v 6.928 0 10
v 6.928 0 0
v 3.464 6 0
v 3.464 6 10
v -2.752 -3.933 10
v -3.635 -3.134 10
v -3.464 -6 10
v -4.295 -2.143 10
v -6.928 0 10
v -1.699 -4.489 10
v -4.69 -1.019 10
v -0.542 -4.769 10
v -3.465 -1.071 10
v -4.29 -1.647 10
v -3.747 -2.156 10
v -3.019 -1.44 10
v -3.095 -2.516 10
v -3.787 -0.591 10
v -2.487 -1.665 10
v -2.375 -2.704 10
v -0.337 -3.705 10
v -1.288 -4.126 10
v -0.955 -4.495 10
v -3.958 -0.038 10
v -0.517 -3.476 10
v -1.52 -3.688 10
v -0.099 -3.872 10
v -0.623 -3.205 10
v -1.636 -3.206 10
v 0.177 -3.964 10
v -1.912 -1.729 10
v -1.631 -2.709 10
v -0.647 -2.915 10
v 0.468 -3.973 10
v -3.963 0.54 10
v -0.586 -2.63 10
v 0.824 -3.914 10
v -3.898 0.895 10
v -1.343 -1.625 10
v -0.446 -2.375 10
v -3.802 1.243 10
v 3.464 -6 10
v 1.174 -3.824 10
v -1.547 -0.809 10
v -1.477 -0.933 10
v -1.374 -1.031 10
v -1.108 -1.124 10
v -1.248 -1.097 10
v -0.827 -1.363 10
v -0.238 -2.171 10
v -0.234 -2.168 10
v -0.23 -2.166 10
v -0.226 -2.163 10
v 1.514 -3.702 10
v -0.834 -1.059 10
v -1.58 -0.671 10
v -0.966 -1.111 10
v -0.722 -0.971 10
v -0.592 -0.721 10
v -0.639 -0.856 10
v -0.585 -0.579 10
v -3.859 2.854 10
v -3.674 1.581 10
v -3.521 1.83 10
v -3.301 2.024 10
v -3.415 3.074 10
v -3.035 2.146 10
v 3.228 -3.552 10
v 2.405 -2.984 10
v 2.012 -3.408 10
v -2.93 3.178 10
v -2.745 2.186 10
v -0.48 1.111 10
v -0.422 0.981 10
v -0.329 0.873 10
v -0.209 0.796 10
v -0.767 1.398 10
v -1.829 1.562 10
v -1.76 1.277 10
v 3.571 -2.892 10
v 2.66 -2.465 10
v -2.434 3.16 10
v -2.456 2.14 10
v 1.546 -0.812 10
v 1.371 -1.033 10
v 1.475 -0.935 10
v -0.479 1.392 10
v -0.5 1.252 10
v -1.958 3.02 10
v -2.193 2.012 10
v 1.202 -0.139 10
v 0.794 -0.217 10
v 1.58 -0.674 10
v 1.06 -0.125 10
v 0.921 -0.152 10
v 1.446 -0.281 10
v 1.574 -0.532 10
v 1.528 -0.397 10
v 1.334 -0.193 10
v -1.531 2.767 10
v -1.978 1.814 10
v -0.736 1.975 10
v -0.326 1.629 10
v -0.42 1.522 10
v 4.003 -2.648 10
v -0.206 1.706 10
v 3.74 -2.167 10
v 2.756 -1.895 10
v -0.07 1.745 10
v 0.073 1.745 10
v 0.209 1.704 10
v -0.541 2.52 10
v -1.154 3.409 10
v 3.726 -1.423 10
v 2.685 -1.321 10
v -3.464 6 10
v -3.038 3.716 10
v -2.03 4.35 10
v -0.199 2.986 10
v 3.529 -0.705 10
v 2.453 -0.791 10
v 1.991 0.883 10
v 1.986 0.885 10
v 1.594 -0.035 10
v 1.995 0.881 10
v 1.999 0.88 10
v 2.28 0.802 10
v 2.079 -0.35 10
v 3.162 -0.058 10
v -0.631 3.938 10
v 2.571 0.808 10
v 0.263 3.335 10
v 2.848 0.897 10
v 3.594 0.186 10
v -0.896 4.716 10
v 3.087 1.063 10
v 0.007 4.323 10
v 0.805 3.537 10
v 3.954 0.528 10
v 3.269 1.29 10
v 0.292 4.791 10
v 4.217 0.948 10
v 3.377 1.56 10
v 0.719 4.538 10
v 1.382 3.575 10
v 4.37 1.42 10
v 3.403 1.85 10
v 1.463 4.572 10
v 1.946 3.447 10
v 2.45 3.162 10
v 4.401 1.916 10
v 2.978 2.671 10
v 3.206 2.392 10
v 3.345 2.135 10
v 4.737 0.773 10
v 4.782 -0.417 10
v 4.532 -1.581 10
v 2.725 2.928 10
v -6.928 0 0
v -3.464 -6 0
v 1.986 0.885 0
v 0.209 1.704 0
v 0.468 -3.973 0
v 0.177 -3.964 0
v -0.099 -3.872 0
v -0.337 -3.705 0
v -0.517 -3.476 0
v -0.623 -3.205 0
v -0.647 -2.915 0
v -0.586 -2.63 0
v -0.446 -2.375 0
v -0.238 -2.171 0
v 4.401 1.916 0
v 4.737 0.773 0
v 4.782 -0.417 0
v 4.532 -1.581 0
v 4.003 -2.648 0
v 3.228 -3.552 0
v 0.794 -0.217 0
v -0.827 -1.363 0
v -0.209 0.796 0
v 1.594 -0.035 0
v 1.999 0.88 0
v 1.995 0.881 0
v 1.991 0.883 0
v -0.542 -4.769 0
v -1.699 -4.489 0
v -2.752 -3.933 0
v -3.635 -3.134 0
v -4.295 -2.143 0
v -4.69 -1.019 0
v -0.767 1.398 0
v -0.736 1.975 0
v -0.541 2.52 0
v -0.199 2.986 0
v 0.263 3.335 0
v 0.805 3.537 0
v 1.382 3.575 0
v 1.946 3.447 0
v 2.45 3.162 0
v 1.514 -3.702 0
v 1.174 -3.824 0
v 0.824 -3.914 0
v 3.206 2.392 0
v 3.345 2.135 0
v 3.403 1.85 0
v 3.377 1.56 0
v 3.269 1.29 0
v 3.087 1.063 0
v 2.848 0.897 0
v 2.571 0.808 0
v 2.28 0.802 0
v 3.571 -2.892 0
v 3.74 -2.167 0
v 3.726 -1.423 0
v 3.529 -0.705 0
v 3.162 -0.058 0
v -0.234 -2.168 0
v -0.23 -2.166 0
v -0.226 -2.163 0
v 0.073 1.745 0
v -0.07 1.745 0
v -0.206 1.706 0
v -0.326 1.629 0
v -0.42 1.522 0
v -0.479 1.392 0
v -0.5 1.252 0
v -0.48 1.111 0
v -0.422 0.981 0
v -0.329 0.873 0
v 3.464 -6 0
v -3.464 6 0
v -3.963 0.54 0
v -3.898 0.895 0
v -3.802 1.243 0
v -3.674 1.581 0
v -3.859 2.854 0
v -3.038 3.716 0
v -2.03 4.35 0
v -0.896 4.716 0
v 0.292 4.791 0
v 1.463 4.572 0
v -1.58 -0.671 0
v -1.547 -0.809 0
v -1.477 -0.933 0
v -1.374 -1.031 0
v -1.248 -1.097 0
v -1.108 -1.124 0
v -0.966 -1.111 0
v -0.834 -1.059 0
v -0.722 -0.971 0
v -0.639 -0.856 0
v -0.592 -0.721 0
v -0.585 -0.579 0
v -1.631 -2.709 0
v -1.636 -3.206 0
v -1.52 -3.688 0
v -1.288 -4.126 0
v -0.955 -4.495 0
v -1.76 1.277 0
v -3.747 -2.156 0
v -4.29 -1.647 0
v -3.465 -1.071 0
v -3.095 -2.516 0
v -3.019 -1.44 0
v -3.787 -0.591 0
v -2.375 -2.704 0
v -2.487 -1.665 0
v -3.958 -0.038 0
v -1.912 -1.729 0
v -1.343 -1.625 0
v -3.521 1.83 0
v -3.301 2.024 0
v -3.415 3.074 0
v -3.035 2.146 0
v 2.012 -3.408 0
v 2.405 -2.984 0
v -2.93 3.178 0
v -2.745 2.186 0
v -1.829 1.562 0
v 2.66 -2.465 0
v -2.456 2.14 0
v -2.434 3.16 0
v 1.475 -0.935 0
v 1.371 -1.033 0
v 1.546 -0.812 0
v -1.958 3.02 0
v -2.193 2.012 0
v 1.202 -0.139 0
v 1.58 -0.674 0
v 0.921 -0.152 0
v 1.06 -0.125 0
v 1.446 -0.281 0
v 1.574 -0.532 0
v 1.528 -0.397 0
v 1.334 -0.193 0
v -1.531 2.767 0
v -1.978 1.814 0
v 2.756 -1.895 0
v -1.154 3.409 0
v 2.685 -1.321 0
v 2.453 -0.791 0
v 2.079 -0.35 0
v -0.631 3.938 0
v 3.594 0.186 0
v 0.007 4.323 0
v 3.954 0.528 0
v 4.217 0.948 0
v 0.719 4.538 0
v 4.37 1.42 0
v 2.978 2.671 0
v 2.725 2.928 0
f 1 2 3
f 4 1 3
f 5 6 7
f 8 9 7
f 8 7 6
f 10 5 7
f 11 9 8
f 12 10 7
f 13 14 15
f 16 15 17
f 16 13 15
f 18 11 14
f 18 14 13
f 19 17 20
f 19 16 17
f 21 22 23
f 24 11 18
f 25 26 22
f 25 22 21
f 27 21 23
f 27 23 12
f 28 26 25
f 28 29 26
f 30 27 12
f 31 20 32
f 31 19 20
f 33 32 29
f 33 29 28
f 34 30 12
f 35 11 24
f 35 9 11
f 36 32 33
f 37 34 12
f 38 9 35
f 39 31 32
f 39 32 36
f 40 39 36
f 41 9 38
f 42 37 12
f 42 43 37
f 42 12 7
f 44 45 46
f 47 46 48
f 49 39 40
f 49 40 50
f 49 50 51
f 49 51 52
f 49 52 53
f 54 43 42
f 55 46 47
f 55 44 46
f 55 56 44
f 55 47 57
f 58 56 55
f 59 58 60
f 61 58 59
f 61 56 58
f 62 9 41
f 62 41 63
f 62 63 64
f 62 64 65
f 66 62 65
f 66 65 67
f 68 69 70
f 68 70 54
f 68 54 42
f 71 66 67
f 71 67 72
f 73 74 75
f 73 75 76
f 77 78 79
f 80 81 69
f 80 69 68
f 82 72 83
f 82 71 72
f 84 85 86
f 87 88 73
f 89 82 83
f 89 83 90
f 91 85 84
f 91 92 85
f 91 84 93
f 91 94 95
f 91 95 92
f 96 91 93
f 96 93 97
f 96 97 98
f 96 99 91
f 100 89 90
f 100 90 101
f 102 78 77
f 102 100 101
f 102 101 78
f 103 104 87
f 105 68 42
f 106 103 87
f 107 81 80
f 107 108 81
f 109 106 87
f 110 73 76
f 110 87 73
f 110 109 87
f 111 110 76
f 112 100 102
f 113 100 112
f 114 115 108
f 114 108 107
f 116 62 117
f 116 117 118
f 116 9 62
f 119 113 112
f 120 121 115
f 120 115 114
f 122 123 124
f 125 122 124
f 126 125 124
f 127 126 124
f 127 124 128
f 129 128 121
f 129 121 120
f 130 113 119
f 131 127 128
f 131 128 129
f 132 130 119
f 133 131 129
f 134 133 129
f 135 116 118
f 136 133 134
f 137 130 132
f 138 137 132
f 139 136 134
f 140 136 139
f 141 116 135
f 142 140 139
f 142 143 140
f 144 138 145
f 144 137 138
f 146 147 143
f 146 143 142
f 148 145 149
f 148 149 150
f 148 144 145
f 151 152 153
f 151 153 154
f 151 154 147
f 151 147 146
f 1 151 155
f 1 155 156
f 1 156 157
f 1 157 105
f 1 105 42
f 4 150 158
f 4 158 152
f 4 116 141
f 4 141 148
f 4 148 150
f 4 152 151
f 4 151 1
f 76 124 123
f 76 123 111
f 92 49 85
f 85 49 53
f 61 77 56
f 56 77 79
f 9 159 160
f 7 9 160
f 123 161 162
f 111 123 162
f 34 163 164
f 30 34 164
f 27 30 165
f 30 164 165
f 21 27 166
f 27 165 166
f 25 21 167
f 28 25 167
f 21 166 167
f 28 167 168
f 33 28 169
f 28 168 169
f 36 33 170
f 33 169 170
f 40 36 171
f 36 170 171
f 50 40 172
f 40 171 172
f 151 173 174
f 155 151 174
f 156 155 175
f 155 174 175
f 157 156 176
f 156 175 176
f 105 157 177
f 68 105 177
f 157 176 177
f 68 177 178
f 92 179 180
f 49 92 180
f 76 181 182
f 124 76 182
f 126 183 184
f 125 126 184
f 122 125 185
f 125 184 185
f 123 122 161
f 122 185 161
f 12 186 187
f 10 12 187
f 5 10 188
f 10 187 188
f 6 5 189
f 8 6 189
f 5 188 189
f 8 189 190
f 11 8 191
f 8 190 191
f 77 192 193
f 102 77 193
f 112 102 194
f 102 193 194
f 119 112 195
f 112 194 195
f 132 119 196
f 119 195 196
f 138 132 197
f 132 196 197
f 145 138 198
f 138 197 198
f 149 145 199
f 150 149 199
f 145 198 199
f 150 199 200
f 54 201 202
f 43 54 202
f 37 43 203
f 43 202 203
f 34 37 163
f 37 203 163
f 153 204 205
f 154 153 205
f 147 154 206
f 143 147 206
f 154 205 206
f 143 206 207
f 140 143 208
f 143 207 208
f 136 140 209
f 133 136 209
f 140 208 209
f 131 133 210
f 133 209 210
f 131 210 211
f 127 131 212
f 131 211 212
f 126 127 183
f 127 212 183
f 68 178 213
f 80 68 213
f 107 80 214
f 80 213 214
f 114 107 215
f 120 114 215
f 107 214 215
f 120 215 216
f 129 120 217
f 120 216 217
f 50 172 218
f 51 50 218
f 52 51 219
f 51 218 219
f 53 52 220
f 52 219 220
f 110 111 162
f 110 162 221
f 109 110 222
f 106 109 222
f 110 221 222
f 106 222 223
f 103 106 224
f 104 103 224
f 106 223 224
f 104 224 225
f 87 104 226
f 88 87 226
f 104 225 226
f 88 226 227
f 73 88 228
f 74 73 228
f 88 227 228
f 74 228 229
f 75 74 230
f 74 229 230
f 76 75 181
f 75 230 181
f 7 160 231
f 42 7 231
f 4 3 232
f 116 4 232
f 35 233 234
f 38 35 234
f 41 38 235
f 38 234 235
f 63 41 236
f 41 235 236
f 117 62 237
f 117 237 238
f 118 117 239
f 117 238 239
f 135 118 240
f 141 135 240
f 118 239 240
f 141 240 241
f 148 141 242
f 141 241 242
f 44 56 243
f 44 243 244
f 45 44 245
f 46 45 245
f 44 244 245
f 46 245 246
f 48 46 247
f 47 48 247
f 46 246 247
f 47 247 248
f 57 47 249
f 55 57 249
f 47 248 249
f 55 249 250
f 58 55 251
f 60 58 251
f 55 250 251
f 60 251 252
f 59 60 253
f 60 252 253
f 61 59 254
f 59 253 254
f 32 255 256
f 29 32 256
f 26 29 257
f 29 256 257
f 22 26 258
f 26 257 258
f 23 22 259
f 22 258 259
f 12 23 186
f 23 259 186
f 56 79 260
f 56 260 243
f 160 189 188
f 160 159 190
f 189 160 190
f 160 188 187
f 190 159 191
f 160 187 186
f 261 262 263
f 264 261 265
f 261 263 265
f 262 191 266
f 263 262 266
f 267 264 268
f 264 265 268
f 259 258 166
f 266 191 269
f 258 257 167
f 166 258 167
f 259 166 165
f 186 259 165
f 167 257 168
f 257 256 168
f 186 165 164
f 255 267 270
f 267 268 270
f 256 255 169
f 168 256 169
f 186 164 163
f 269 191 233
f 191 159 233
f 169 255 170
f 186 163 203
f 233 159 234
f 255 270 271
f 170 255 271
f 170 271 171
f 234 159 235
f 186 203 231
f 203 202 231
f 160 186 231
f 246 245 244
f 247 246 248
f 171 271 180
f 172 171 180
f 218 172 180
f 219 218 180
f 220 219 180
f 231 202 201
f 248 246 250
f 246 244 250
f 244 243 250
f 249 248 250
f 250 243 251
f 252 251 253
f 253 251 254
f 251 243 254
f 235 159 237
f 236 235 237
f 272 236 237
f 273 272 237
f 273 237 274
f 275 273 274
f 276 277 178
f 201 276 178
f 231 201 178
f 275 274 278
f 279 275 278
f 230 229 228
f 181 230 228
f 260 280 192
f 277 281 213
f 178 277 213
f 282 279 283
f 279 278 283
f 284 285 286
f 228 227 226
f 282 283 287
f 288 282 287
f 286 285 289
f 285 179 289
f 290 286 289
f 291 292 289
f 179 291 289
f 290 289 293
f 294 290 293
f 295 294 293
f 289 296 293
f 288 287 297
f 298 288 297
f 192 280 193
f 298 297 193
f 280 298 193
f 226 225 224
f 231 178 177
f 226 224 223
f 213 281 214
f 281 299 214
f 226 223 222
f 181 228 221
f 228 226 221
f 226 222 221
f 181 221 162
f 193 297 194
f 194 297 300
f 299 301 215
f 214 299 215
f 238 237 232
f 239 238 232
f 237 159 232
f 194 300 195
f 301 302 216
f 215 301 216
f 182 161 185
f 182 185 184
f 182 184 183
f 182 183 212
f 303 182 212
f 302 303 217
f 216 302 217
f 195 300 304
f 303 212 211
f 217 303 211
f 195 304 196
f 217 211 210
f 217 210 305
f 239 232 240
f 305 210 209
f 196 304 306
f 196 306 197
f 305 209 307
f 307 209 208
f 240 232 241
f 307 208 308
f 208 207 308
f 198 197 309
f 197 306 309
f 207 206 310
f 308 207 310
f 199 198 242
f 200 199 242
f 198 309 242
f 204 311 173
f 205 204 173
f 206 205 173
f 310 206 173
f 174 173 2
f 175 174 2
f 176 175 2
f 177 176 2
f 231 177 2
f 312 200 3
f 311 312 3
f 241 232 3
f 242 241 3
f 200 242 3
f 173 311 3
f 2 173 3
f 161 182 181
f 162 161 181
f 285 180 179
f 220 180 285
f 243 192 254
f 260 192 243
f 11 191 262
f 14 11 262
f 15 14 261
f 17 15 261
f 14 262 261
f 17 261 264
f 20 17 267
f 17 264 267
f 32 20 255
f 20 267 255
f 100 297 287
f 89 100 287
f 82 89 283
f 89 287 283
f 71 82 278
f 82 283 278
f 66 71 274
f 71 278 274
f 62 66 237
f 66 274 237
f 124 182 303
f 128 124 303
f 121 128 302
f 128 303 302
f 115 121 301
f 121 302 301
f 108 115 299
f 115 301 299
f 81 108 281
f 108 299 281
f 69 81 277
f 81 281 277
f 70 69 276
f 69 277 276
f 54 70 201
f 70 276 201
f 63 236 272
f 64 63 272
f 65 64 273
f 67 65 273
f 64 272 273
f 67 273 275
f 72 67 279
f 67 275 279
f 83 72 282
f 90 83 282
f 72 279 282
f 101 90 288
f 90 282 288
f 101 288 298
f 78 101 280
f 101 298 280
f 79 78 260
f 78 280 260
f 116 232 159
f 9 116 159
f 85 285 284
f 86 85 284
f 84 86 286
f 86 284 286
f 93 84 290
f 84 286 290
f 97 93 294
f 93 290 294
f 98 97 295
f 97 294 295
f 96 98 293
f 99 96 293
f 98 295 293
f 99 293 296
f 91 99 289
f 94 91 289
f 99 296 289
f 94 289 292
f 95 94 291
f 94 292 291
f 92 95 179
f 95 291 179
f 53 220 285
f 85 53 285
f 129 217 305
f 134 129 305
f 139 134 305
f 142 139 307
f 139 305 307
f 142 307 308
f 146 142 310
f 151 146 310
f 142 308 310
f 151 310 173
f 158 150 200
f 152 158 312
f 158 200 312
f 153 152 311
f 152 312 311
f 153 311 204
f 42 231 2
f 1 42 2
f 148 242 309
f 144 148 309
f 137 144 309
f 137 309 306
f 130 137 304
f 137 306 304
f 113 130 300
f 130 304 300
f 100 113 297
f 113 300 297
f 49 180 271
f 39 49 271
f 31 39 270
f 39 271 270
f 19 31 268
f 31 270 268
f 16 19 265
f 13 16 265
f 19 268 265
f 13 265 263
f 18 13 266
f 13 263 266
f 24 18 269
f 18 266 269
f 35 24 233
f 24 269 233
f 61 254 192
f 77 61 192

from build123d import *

# Parameters (mm, degrees)
F1_DEPTH = 10


with BuildPart() as f1:
    # F0 (on Top) → F1 (new body)
    with BuildSketch(Plane.XY):
        Polygon((3.464102, 6), (-3.464102, 6), (-6.928203, 0), (-3.464102, -6), (3.464102, -6), (6.928203, 0), align=None)
        with BuildLine():
            ThreePointArc((-0.54173, -4.769332), (-3.218595, -3.560989), (-4.690485, -1.019485))
            ThreePointArc((-4.690485, -1.019485), (-3.432213, -2.356022), (-1.630911, -2.709417))
            ThreePointArc((-1.630911, -2.709417), (-1.417251, -3.914354), (-0.54173, -4.769332))
        make_face(mode=Mode.SUBTRACT)
        with BuildLine():
            Line((1.986308, 0.885414), (0.209216, 1.704124))
            ThreePointArc((0.209216, 1.704124), (-0.454124, 1.459216), (-0.209216, 0.795876))
            Line((-0.209216, 0.795876), (1.593748, -0.034753))
            ThreePointArc((1.593748, -0.034753), (2.75641, -1.894851), (1.51377, -3.702499))
            ThreePointArc((1.51377, -3.702499), (1.000033, -3.872975), (0.467983, -3.97253))
            ThreePointArc((0.467983, -3.97253), (-0.580071, -3.344267), (-0.237933, -2.171206))
            ThreePointArc((-0.237933, -2.171206), (-0.232163, -2.167033), (-0.226363, -2.162901))
            Line((-0.226363, -2.162901), (1.371207, -1.033248))
            ThreePointArc((1.371207, -1.033248), (1.49078, -0.336325), (0.793857, -0.216752))
            Line((0.793857, -0.216752), (-0.826971, -1.36285))
            ThreePointArc((-0.826971, -1.36285), (-3.019194, -1.439695), (-3.963343, 0.540286))
            ThreePointArc((-3.963343, 0.540286), (-3.854111, 1.070434), (-3.674303, 1.580979))
            ThreePointArc((-3.674303, 1.580979), (-2.599148, 2.1734), (-1.759946, 1.277486))
            Line((-1.759946, 1.277486), (-1.580423, -0.670876))
            ThreePointArc((-1.580423, -0.670876), (-1.036656, -1.122891), (-0.584641, -0.579124))
            Line((-0.584641, -0.579124), (-0.766777, 1.397603))
            ThreePointArc((-0.766777, 1.397603), (0.262784, 3.334546), (2.449573, 3.162213))
            ThreePointArc((2.449573, 3.162213), (2.854078, 2.802541), (3.20632, 2.39155))
            ThreePointArc((3.20632, 2.39155), (3.186256, 1.169777), (1.999286, 0.879547))
            ThreePointArc((1.999286, 0.879547), (1.992787, 0.882458), (1.986308, 0.885414))
        make_face(mode=Mode.SUBTRACT)
        with BuildLine():
            ThreePointArc((3.228143, -3.552336), (3.756481, -1.794373), (3.161879, -0.057702))
            ThreePointArc((3.161879, -0.057702), (4.098556, 0.729802), (4.401228, 1.915514))
            ThreePointArc((4.401228, 1.915514), (4.693205, -1.006891), (3.228143, -3.552336))
        make_face(mode=Mode.SUBTRACT)
        with BuildLine():
            ThreePointArc((-3.859498, 2.853818), (-1.474328, 4.567971), (1.462906, 4.571641))
            ThreePointArc((1.462906, 4.571641), (-0.323966, 4.150419), (-1.530858, 2.767033))
            ThreePointArc((-1.530858, 2.767033), (-2.681235, 3.18455), (-3.859498, 2.853818))
        make_face(mode=Mode.SUBTRACT)
    extrude(amount=F1_DEPTH)


solid = f1.part
